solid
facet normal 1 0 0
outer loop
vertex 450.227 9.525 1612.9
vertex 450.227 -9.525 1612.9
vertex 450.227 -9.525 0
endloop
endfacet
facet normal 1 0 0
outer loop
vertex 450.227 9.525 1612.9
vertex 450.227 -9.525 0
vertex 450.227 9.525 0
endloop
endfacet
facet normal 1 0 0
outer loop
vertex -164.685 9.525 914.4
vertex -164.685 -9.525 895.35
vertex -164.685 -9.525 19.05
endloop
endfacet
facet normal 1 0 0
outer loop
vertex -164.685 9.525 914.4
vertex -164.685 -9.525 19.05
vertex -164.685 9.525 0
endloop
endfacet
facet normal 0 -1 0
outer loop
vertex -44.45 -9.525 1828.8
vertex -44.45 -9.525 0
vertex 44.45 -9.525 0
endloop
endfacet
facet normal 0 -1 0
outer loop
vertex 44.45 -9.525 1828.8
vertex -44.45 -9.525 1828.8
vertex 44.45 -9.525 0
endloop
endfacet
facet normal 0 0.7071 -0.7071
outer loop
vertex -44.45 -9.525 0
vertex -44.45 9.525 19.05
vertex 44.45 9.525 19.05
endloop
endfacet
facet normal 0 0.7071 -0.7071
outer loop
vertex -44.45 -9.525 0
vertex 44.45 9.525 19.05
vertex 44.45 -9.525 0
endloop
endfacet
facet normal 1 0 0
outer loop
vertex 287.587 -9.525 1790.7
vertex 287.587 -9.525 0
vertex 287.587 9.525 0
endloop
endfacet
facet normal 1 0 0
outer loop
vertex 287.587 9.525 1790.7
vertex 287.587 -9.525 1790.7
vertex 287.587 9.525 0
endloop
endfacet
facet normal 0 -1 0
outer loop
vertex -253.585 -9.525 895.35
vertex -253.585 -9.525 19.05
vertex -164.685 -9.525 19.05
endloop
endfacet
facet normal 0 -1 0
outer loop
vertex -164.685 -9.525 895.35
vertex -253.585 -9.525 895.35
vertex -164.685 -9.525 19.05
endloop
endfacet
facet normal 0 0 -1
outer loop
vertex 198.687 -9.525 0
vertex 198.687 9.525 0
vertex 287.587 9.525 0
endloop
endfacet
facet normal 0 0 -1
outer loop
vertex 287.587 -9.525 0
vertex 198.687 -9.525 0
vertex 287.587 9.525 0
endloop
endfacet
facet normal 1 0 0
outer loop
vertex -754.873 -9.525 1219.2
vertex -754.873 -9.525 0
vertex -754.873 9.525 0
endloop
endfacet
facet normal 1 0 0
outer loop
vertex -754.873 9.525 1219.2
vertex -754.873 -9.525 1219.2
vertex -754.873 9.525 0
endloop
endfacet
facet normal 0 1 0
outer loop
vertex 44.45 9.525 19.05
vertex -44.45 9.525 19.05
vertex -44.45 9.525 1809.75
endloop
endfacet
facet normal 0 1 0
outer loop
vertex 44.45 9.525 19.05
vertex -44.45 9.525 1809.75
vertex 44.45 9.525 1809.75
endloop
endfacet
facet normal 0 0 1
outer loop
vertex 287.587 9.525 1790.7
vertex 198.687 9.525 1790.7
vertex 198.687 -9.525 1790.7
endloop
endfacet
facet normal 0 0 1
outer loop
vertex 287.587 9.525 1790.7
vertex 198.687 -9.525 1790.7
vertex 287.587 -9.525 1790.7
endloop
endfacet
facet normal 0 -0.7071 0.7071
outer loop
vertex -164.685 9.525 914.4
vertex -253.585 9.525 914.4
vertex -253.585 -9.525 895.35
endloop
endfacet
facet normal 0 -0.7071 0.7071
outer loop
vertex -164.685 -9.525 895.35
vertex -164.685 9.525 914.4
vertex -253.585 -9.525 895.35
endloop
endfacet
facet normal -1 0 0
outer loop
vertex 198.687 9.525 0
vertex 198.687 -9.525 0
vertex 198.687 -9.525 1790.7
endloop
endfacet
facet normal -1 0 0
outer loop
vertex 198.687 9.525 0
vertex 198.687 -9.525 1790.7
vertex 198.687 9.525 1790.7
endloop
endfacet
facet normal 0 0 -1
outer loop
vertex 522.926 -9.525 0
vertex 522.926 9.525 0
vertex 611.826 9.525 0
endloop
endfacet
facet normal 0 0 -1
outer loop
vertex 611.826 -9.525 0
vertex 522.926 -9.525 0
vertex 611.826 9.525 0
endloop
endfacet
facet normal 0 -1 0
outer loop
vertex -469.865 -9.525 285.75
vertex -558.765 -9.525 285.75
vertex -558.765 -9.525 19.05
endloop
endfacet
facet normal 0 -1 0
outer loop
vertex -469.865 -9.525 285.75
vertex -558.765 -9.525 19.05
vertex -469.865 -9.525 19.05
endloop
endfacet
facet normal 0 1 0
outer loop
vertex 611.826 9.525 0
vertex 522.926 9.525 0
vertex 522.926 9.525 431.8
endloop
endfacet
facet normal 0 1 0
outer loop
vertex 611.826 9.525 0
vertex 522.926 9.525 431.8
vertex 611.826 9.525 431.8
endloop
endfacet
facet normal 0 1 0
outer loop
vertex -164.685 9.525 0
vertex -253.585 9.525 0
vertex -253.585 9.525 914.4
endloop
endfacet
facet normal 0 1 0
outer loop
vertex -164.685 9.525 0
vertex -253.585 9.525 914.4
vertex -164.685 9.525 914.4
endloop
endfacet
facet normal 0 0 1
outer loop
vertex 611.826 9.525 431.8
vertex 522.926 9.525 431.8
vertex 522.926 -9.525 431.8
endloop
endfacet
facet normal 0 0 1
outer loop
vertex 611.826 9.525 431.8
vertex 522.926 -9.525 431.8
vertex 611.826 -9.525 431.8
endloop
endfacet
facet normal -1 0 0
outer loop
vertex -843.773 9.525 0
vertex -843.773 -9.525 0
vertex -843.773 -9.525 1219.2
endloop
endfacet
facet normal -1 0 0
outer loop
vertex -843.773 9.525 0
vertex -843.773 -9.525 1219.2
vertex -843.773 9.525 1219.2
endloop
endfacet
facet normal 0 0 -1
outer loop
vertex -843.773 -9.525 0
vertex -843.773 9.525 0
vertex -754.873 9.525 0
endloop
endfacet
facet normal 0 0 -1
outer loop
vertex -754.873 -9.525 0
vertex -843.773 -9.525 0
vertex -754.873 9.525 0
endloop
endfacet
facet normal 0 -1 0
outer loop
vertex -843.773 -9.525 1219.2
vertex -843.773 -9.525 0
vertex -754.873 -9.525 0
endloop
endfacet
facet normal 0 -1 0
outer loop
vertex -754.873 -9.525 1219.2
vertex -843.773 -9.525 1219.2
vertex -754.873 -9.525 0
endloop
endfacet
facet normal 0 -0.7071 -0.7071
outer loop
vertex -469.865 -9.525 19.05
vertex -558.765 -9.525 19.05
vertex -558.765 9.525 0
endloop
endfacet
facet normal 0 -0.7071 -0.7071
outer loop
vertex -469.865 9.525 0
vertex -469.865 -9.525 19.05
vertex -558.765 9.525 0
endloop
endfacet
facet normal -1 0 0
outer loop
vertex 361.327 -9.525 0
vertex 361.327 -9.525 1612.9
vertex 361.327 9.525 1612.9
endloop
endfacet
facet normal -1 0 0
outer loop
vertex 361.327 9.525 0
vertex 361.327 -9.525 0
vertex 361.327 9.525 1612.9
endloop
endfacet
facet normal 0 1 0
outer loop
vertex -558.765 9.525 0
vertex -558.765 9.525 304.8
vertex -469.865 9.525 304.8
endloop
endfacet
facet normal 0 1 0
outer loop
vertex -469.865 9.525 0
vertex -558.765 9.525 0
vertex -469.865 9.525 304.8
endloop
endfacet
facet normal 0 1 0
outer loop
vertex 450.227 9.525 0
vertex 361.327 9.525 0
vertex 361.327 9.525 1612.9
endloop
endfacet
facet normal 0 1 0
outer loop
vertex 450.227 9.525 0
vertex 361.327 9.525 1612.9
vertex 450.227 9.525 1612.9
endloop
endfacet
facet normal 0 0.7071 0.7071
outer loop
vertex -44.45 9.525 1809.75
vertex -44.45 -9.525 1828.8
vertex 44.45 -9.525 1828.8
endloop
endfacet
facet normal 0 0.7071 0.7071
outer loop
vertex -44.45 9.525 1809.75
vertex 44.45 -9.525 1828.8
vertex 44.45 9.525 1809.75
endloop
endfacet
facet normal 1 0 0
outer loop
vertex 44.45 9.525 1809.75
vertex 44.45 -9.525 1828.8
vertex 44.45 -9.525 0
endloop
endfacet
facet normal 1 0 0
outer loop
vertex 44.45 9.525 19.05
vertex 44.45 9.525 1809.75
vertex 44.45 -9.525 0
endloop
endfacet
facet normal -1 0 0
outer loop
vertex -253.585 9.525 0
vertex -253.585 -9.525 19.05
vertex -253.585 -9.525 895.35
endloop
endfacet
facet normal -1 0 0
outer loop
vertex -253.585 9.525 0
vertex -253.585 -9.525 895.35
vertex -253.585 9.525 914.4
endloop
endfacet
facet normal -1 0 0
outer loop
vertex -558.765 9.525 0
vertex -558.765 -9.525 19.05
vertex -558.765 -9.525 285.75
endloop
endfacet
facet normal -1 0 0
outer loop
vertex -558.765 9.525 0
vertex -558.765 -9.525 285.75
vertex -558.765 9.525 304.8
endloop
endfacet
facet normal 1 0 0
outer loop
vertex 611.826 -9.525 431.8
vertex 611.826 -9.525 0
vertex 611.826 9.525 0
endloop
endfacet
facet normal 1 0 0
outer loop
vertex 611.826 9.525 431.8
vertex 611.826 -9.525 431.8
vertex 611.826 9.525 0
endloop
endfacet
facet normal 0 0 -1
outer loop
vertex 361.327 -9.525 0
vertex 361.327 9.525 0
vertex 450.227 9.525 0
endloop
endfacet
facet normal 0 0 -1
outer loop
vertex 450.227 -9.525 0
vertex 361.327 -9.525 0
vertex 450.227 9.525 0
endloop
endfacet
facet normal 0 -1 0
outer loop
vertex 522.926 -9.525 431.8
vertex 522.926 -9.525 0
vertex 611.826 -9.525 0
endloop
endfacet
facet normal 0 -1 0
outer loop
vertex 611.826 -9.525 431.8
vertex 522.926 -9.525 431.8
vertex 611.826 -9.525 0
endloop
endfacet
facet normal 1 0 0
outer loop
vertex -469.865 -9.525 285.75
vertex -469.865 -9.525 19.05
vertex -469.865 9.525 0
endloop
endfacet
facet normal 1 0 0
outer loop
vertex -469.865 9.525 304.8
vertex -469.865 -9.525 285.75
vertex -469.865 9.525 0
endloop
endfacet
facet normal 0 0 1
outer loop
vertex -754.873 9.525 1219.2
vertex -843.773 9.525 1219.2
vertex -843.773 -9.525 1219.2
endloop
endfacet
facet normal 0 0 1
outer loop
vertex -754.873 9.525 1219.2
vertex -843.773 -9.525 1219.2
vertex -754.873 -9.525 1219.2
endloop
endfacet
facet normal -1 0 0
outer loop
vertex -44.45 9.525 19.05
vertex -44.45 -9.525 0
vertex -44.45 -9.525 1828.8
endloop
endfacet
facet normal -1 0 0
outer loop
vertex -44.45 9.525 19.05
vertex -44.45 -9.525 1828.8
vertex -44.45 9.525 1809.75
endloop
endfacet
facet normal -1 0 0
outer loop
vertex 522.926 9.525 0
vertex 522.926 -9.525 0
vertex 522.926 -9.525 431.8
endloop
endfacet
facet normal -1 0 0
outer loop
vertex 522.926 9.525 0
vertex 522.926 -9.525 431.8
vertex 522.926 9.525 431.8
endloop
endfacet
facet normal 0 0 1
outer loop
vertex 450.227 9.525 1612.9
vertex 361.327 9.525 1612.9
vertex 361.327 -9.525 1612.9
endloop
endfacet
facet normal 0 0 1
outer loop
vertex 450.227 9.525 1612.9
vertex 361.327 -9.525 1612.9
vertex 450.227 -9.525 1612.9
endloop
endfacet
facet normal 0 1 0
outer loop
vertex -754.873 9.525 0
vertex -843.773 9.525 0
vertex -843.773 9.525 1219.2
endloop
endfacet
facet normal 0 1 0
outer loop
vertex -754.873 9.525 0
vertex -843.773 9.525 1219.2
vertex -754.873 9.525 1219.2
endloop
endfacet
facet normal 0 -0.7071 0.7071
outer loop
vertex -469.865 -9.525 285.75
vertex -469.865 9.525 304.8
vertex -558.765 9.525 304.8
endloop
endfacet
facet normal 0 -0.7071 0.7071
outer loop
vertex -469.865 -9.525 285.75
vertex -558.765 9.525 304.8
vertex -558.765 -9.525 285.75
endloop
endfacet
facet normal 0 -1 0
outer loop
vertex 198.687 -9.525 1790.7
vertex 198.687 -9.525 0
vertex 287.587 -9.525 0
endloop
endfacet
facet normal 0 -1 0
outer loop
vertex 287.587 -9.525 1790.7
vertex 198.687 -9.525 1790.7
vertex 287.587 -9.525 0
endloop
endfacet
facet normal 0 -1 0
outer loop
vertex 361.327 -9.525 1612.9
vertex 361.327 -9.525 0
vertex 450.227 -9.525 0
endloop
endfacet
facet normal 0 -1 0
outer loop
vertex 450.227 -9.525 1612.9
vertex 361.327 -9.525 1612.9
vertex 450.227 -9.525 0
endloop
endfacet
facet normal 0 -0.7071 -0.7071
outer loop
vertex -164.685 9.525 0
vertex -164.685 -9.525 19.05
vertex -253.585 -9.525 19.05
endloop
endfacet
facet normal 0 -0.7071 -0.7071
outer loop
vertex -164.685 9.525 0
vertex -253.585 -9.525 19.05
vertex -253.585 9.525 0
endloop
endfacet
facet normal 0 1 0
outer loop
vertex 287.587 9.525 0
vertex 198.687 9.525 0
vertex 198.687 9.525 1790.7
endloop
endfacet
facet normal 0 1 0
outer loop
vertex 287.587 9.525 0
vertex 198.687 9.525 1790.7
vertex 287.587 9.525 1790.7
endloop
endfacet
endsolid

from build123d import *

# Parameters (mm, degrees)
F0_W      = 88.9
F0_H      = 19.05
F1_DEPTH  = 1828.8
F3_DEPTH  = 413.46128
F4_W      = 88.9
F4_H      = 19.05
F5_DEPTH  = 914.4
F7_DEPTH  = 204.40578
F8_W      = 88.9
F8_H      = 19.05
F9_DEPTH  = 1790.7
F10_W     = 88.9
F10_H     = 19.05
F11_DEPTH = 304.8
F13_DEPTH = 205.58275
F14_W     = 88.9
F14_H     = 19.05
F15_DEPTH = 1612.9
F16_W     = 88.9
F16_H     = 19.05
F17_DEPTH = 1219.2
F18_W     = 88.9
F18_H     = 19.05
F19_DEPTH = 431.8


with BuildPart() as f1:
    # F0 (on Top) → F1 (new body)
    with BuildSketch(Plane.XY):
        Rectangle(F0_W, F0_H)
    extrude(amount=F1_DEPTH)

    # F2 (on face) → F3 (cut)
    with BuildSketch(Plane.YZ.offset(44.45)):
        Polygon((9.525, 1828.8), (-9.525, 1828.8), (9.525, 1809.75), align=None)
        Polygon((9.525, 19.05), (-9.525, 0), (9.525, 0), align=None)
    extrude(amount=-F3_DEPTH, mode=Mode.SUBTRACT)


with BuildPart() as f5:
    # F4 (on Top) → F5 (new body)
    with BuildSketch(Plane.XY):
        with Locations((-209.135253, 0)):
            Rectangle(F4_W, F4_H)
    extrude(amount=F5_DEPTH)

    # F6 (on face) → F7 (cut)
    with BuildSketch(Plane(origin=(-253.585253, 0, 0), x_dir=(0, -1, 0), z_dir=(-1, 0, 0))):
        Polygon((9.525, 914.4), (-9.525, 914.4), (9.525, 895.35), align=None)
        Polygon((9.525, 19.05), (-9.525, 0), (9.525, 0), align=None)
    extrude(amount=-F7_DEPTH, mode=Mode.SUBTRACT)


with BuildPart() as f9:
    # F8 (on Top) → F9 (new body)
    with BuildSketch(Plane.XY):
        with Locations((243.136883, 0)):
            Rectangle(F8_W, F8_H)
    extrude(amount=F9_DEPTH)


with BuildPart() as f11:
    # F10 (on Top) → F11 (new body)
    with BuildSketch(Plane.XY):
        with Locations((-514.314536, 0)):
            Rectangle(F10_W, F10_H)
    extrude(amount=F11_DEPTH)

    # F12 (on face) → F13 (cut)
    with BuildSketch(Plane(origin=(-558.764536, 0, 0), x_dir=(0, -1, 0), z_dir=(-1, 0, 0))):
        Polygon((9.525, 19.05), (-9.525, 0), (9.525, 0), align=None)
        Polygon((9.525, 304.8), (-9.525, 304.8), (9.525, 285.75), align=None)
    extrude(amount=-F13_DEPTH, mode=Mode.SUBTRACT)


with BuildPart() as f15:
    # F14 (on Top) → F15 (new body)
    with BuildSketch(Plane.XY):
        with Locations((405.776913, 0)):
            Rectangle(F14_W, F14_H)
    extrude(amount=F15_DEPTH)


with BuildPart() as f17:
    # F16 (on Top) → F17 (new body)
    with BuildSketch(Plane.XY):
        with Locations((-799.323208, 0)):
            Rectangle(F16_W, F16_H)
    extrude(amount=F17_DEPTH)


with BuildPart() as f19:
    # F18 (on Top) → F19 (new body)
    with BuildSketch(Plane.XY):
        with Locations((567.375932, 0)):
            Rectangle(F18_W, F18_H)
    extrude(amount=F19_DEPTH)


solid = Compound([f1.part, f5.part, f9.part, f11.part, f15.part, f17.part, f19.part])
